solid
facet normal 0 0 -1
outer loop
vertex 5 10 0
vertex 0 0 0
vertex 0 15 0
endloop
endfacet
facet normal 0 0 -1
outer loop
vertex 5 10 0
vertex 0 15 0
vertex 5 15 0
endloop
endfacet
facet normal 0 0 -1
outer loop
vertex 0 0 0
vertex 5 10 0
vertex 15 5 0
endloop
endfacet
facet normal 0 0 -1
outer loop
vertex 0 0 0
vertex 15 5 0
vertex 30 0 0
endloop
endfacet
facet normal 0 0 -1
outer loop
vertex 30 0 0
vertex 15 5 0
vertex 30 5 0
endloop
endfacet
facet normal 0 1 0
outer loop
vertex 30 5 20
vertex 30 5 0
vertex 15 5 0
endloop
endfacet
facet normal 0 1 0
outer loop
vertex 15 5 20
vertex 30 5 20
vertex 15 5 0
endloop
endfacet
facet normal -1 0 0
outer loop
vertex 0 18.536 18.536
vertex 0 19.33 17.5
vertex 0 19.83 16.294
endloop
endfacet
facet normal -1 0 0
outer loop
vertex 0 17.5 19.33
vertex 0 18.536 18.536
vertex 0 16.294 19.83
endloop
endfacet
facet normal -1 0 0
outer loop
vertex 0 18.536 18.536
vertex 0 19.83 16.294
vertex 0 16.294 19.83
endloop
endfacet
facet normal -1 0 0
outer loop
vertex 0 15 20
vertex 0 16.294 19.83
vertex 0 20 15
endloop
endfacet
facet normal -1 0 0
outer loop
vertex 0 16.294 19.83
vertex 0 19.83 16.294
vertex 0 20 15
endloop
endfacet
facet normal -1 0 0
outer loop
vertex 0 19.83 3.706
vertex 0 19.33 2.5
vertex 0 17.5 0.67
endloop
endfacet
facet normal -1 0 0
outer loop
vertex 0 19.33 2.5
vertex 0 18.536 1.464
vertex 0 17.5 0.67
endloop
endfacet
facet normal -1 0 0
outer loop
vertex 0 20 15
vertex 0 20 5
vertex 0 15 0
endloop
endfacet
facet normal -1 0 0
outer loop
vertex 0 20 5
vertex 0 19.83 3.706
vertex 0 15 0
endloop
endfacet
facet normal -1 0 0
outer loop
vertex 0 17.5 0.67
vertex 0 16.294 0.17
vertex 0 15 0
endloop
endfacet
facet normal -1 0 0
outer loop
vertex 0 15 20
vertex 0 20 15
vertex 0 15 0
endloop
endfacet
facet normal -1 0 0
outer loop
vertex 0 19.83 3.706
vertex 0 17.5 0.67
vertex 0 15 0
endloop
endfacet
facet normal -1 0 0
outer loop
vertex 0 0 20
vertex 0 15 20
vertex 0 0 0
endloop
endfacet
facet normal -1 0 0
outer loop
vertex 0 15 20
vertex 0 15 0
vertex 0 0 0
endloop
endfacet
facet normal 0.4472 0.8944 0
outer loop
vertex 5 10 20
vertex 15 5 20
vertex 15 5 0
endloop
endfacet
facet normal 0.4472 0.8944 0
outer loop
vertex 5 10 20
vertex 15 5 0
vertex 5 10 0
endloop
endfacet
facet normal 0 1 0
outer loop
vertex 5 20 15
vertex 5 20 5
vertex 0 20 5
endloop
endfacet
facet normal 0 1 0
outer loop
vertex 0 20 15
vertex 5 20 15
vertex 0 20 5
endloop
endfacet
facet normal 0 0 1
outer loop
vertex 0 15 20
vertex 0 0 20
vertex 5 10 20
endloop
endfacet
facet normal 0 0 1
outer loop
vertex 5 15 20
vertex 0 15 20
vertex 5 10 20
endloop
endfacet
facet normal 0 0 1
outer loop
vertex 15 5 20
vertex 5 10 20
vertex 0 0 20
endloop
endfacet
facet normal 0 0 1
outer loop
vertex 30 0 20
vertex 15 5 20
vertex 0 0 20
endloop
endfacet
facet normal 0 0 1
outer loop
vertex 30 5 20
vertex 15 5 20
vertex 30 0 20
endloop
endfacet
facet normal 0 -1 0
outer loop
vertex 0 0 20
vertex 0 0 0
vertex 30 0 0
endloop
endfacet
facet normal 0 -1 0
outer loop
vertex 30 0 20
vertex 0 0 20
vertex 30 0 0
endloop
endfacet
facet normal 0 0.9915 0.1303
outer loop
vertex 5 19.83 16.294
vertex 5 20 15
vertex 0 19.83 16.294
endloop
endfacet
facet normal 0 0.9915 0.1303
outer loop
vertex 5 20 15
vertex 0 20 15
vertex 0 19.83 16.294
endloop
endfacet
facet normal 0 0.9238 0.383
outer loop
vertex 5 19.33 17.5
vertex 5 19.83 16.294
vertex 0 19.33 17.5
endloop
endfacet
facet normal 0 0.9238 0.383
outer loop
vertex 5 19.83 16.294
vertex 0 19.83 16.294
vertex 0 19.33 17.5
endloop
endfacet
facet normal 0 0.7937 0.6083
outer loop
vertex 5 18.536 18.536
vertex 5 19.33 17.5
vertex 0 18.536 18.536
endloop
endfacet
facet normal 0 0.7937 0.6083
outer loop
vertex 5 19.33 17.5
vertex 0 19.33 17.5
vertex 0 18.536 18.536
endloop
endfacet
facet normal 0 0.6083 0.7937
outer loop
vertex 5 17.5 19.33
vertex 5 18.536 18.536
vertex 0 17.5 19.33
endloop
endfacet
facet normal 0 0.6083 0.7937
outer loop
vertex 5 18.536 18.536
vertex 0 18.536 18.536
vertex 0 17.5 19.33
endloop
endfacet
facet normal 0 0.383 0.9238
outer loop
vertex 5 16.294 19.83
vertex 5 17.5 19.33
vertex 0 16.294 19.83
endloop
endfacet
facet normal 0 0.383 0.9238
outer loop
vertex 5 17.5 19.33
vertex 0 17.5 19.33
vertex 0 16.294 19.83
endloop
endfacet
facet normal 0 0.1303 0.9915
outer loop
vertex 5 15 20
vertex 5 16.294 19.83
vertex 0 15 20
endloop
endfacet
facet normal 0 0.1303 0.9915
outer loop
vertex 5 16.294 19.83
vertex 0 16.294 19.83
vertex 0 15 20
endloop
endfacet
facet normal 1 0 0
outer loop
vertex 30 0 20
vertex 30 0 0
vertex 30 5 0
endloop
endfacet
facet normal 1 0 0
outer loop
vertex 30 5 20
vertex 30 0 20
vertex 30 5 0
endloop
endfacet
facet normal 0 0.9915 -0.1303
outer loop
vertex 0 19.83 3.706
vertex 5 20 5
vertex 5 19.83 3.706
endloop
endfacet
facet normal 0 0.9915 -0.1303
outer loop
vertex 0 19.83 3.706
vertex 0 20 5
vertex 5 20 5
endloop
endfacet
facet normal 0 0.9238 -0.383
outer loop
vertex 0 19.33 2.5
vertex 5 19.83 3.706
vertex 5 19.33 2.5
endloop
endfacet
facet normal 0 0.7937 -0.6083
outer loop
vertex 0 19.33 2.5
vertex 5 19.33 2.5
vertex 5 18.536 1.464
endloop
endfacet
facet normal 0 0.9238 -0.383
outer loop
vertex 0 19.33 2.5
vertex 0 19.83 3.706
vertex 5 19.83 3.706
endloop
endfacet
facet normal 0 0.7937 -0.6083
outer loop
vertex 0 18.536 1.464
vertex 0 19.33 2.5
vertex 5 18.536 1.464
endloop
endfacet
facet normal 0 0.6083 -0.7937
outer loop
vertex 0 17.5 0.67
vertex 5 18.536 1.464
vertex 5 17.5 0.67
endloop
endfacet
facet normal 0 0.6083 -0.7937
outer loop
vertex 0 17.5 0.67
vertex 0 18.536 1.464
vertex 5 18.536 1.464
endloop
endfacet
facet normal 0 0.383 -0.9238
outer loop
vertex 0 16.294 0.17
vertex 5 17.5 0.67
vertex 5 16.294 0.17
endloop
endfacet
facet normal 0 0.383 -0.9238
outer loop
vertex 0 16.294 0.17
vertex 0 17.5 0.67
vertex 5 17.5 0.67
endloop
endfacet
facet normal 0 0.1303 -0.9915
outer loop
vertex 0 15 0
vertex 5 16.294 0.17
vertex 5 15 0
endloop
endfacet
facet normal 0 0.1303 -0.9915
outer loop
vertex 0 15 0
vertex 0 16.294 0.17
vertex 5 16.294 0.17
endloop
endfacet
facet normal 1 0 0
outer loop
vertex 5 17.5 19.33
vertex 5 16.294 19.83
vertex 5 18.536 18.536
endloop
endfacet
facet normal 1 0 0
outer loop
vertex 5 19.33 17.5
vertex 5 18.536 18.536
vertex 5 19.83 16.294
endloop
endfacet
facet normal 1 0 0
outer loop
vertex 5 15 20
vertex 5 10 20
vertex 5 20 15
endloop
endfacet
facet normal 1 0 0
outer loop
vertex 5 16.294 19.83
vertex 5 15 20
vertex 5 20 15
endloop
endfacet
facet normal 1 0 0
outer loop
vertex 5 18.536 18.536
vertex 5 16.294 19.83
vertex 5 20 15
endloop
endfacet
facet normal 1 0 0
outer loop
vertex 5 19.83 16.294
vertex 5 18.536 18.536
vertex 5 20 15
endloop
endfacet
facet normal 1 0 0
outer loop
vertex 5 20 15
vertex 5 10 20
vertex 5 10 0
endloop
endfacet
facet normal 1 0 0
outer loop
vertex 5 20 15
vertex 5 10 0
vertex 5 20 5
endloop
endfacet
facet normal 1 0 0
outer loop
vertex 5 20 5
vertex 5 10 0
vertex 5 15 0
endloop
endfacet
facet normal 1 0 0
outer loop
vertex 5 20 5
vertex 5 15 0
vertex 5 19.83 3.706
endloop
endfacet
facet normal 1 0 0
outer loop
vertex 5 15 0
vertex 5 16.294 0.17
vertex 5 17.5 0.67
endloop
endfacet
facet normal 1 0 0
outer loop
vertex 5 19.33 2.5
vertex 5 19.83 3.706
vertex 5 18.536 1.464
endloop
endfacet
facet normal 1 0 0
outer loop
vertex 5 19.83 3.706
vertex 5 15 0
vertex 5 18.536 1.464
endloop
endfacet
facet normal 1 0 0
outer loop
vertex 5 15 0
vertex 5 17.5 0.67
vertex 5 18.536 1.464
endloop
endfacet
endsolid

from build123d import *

# Parameters (mm, degrees)
EXTRUDE_1_DEPTH = 20
FILLET_1_R      = 5


with BuildPart() as part:
    # 草圖1 → 填料-伸長1 (new body)
    with BuildSketch(Plane.XY):
        Polygon((30, 5), (15, 5), (5, 10), (5, 20), (0, 20), (0, 5), (0, 0), (5, 0), (30, 0), align=None)
    extrude(amount=EXTRUDE_1_DEPTH)

    # 圓角1
    fillet_1_edges = [part.edges().sort_by_distance(p)[0] for p in [
        (2.5, 20, 20),
        (2.5, 20, 0),
    ]]
    fillet(fillet_1_edges, radius=FILLET_1_R)


solid = part.part
